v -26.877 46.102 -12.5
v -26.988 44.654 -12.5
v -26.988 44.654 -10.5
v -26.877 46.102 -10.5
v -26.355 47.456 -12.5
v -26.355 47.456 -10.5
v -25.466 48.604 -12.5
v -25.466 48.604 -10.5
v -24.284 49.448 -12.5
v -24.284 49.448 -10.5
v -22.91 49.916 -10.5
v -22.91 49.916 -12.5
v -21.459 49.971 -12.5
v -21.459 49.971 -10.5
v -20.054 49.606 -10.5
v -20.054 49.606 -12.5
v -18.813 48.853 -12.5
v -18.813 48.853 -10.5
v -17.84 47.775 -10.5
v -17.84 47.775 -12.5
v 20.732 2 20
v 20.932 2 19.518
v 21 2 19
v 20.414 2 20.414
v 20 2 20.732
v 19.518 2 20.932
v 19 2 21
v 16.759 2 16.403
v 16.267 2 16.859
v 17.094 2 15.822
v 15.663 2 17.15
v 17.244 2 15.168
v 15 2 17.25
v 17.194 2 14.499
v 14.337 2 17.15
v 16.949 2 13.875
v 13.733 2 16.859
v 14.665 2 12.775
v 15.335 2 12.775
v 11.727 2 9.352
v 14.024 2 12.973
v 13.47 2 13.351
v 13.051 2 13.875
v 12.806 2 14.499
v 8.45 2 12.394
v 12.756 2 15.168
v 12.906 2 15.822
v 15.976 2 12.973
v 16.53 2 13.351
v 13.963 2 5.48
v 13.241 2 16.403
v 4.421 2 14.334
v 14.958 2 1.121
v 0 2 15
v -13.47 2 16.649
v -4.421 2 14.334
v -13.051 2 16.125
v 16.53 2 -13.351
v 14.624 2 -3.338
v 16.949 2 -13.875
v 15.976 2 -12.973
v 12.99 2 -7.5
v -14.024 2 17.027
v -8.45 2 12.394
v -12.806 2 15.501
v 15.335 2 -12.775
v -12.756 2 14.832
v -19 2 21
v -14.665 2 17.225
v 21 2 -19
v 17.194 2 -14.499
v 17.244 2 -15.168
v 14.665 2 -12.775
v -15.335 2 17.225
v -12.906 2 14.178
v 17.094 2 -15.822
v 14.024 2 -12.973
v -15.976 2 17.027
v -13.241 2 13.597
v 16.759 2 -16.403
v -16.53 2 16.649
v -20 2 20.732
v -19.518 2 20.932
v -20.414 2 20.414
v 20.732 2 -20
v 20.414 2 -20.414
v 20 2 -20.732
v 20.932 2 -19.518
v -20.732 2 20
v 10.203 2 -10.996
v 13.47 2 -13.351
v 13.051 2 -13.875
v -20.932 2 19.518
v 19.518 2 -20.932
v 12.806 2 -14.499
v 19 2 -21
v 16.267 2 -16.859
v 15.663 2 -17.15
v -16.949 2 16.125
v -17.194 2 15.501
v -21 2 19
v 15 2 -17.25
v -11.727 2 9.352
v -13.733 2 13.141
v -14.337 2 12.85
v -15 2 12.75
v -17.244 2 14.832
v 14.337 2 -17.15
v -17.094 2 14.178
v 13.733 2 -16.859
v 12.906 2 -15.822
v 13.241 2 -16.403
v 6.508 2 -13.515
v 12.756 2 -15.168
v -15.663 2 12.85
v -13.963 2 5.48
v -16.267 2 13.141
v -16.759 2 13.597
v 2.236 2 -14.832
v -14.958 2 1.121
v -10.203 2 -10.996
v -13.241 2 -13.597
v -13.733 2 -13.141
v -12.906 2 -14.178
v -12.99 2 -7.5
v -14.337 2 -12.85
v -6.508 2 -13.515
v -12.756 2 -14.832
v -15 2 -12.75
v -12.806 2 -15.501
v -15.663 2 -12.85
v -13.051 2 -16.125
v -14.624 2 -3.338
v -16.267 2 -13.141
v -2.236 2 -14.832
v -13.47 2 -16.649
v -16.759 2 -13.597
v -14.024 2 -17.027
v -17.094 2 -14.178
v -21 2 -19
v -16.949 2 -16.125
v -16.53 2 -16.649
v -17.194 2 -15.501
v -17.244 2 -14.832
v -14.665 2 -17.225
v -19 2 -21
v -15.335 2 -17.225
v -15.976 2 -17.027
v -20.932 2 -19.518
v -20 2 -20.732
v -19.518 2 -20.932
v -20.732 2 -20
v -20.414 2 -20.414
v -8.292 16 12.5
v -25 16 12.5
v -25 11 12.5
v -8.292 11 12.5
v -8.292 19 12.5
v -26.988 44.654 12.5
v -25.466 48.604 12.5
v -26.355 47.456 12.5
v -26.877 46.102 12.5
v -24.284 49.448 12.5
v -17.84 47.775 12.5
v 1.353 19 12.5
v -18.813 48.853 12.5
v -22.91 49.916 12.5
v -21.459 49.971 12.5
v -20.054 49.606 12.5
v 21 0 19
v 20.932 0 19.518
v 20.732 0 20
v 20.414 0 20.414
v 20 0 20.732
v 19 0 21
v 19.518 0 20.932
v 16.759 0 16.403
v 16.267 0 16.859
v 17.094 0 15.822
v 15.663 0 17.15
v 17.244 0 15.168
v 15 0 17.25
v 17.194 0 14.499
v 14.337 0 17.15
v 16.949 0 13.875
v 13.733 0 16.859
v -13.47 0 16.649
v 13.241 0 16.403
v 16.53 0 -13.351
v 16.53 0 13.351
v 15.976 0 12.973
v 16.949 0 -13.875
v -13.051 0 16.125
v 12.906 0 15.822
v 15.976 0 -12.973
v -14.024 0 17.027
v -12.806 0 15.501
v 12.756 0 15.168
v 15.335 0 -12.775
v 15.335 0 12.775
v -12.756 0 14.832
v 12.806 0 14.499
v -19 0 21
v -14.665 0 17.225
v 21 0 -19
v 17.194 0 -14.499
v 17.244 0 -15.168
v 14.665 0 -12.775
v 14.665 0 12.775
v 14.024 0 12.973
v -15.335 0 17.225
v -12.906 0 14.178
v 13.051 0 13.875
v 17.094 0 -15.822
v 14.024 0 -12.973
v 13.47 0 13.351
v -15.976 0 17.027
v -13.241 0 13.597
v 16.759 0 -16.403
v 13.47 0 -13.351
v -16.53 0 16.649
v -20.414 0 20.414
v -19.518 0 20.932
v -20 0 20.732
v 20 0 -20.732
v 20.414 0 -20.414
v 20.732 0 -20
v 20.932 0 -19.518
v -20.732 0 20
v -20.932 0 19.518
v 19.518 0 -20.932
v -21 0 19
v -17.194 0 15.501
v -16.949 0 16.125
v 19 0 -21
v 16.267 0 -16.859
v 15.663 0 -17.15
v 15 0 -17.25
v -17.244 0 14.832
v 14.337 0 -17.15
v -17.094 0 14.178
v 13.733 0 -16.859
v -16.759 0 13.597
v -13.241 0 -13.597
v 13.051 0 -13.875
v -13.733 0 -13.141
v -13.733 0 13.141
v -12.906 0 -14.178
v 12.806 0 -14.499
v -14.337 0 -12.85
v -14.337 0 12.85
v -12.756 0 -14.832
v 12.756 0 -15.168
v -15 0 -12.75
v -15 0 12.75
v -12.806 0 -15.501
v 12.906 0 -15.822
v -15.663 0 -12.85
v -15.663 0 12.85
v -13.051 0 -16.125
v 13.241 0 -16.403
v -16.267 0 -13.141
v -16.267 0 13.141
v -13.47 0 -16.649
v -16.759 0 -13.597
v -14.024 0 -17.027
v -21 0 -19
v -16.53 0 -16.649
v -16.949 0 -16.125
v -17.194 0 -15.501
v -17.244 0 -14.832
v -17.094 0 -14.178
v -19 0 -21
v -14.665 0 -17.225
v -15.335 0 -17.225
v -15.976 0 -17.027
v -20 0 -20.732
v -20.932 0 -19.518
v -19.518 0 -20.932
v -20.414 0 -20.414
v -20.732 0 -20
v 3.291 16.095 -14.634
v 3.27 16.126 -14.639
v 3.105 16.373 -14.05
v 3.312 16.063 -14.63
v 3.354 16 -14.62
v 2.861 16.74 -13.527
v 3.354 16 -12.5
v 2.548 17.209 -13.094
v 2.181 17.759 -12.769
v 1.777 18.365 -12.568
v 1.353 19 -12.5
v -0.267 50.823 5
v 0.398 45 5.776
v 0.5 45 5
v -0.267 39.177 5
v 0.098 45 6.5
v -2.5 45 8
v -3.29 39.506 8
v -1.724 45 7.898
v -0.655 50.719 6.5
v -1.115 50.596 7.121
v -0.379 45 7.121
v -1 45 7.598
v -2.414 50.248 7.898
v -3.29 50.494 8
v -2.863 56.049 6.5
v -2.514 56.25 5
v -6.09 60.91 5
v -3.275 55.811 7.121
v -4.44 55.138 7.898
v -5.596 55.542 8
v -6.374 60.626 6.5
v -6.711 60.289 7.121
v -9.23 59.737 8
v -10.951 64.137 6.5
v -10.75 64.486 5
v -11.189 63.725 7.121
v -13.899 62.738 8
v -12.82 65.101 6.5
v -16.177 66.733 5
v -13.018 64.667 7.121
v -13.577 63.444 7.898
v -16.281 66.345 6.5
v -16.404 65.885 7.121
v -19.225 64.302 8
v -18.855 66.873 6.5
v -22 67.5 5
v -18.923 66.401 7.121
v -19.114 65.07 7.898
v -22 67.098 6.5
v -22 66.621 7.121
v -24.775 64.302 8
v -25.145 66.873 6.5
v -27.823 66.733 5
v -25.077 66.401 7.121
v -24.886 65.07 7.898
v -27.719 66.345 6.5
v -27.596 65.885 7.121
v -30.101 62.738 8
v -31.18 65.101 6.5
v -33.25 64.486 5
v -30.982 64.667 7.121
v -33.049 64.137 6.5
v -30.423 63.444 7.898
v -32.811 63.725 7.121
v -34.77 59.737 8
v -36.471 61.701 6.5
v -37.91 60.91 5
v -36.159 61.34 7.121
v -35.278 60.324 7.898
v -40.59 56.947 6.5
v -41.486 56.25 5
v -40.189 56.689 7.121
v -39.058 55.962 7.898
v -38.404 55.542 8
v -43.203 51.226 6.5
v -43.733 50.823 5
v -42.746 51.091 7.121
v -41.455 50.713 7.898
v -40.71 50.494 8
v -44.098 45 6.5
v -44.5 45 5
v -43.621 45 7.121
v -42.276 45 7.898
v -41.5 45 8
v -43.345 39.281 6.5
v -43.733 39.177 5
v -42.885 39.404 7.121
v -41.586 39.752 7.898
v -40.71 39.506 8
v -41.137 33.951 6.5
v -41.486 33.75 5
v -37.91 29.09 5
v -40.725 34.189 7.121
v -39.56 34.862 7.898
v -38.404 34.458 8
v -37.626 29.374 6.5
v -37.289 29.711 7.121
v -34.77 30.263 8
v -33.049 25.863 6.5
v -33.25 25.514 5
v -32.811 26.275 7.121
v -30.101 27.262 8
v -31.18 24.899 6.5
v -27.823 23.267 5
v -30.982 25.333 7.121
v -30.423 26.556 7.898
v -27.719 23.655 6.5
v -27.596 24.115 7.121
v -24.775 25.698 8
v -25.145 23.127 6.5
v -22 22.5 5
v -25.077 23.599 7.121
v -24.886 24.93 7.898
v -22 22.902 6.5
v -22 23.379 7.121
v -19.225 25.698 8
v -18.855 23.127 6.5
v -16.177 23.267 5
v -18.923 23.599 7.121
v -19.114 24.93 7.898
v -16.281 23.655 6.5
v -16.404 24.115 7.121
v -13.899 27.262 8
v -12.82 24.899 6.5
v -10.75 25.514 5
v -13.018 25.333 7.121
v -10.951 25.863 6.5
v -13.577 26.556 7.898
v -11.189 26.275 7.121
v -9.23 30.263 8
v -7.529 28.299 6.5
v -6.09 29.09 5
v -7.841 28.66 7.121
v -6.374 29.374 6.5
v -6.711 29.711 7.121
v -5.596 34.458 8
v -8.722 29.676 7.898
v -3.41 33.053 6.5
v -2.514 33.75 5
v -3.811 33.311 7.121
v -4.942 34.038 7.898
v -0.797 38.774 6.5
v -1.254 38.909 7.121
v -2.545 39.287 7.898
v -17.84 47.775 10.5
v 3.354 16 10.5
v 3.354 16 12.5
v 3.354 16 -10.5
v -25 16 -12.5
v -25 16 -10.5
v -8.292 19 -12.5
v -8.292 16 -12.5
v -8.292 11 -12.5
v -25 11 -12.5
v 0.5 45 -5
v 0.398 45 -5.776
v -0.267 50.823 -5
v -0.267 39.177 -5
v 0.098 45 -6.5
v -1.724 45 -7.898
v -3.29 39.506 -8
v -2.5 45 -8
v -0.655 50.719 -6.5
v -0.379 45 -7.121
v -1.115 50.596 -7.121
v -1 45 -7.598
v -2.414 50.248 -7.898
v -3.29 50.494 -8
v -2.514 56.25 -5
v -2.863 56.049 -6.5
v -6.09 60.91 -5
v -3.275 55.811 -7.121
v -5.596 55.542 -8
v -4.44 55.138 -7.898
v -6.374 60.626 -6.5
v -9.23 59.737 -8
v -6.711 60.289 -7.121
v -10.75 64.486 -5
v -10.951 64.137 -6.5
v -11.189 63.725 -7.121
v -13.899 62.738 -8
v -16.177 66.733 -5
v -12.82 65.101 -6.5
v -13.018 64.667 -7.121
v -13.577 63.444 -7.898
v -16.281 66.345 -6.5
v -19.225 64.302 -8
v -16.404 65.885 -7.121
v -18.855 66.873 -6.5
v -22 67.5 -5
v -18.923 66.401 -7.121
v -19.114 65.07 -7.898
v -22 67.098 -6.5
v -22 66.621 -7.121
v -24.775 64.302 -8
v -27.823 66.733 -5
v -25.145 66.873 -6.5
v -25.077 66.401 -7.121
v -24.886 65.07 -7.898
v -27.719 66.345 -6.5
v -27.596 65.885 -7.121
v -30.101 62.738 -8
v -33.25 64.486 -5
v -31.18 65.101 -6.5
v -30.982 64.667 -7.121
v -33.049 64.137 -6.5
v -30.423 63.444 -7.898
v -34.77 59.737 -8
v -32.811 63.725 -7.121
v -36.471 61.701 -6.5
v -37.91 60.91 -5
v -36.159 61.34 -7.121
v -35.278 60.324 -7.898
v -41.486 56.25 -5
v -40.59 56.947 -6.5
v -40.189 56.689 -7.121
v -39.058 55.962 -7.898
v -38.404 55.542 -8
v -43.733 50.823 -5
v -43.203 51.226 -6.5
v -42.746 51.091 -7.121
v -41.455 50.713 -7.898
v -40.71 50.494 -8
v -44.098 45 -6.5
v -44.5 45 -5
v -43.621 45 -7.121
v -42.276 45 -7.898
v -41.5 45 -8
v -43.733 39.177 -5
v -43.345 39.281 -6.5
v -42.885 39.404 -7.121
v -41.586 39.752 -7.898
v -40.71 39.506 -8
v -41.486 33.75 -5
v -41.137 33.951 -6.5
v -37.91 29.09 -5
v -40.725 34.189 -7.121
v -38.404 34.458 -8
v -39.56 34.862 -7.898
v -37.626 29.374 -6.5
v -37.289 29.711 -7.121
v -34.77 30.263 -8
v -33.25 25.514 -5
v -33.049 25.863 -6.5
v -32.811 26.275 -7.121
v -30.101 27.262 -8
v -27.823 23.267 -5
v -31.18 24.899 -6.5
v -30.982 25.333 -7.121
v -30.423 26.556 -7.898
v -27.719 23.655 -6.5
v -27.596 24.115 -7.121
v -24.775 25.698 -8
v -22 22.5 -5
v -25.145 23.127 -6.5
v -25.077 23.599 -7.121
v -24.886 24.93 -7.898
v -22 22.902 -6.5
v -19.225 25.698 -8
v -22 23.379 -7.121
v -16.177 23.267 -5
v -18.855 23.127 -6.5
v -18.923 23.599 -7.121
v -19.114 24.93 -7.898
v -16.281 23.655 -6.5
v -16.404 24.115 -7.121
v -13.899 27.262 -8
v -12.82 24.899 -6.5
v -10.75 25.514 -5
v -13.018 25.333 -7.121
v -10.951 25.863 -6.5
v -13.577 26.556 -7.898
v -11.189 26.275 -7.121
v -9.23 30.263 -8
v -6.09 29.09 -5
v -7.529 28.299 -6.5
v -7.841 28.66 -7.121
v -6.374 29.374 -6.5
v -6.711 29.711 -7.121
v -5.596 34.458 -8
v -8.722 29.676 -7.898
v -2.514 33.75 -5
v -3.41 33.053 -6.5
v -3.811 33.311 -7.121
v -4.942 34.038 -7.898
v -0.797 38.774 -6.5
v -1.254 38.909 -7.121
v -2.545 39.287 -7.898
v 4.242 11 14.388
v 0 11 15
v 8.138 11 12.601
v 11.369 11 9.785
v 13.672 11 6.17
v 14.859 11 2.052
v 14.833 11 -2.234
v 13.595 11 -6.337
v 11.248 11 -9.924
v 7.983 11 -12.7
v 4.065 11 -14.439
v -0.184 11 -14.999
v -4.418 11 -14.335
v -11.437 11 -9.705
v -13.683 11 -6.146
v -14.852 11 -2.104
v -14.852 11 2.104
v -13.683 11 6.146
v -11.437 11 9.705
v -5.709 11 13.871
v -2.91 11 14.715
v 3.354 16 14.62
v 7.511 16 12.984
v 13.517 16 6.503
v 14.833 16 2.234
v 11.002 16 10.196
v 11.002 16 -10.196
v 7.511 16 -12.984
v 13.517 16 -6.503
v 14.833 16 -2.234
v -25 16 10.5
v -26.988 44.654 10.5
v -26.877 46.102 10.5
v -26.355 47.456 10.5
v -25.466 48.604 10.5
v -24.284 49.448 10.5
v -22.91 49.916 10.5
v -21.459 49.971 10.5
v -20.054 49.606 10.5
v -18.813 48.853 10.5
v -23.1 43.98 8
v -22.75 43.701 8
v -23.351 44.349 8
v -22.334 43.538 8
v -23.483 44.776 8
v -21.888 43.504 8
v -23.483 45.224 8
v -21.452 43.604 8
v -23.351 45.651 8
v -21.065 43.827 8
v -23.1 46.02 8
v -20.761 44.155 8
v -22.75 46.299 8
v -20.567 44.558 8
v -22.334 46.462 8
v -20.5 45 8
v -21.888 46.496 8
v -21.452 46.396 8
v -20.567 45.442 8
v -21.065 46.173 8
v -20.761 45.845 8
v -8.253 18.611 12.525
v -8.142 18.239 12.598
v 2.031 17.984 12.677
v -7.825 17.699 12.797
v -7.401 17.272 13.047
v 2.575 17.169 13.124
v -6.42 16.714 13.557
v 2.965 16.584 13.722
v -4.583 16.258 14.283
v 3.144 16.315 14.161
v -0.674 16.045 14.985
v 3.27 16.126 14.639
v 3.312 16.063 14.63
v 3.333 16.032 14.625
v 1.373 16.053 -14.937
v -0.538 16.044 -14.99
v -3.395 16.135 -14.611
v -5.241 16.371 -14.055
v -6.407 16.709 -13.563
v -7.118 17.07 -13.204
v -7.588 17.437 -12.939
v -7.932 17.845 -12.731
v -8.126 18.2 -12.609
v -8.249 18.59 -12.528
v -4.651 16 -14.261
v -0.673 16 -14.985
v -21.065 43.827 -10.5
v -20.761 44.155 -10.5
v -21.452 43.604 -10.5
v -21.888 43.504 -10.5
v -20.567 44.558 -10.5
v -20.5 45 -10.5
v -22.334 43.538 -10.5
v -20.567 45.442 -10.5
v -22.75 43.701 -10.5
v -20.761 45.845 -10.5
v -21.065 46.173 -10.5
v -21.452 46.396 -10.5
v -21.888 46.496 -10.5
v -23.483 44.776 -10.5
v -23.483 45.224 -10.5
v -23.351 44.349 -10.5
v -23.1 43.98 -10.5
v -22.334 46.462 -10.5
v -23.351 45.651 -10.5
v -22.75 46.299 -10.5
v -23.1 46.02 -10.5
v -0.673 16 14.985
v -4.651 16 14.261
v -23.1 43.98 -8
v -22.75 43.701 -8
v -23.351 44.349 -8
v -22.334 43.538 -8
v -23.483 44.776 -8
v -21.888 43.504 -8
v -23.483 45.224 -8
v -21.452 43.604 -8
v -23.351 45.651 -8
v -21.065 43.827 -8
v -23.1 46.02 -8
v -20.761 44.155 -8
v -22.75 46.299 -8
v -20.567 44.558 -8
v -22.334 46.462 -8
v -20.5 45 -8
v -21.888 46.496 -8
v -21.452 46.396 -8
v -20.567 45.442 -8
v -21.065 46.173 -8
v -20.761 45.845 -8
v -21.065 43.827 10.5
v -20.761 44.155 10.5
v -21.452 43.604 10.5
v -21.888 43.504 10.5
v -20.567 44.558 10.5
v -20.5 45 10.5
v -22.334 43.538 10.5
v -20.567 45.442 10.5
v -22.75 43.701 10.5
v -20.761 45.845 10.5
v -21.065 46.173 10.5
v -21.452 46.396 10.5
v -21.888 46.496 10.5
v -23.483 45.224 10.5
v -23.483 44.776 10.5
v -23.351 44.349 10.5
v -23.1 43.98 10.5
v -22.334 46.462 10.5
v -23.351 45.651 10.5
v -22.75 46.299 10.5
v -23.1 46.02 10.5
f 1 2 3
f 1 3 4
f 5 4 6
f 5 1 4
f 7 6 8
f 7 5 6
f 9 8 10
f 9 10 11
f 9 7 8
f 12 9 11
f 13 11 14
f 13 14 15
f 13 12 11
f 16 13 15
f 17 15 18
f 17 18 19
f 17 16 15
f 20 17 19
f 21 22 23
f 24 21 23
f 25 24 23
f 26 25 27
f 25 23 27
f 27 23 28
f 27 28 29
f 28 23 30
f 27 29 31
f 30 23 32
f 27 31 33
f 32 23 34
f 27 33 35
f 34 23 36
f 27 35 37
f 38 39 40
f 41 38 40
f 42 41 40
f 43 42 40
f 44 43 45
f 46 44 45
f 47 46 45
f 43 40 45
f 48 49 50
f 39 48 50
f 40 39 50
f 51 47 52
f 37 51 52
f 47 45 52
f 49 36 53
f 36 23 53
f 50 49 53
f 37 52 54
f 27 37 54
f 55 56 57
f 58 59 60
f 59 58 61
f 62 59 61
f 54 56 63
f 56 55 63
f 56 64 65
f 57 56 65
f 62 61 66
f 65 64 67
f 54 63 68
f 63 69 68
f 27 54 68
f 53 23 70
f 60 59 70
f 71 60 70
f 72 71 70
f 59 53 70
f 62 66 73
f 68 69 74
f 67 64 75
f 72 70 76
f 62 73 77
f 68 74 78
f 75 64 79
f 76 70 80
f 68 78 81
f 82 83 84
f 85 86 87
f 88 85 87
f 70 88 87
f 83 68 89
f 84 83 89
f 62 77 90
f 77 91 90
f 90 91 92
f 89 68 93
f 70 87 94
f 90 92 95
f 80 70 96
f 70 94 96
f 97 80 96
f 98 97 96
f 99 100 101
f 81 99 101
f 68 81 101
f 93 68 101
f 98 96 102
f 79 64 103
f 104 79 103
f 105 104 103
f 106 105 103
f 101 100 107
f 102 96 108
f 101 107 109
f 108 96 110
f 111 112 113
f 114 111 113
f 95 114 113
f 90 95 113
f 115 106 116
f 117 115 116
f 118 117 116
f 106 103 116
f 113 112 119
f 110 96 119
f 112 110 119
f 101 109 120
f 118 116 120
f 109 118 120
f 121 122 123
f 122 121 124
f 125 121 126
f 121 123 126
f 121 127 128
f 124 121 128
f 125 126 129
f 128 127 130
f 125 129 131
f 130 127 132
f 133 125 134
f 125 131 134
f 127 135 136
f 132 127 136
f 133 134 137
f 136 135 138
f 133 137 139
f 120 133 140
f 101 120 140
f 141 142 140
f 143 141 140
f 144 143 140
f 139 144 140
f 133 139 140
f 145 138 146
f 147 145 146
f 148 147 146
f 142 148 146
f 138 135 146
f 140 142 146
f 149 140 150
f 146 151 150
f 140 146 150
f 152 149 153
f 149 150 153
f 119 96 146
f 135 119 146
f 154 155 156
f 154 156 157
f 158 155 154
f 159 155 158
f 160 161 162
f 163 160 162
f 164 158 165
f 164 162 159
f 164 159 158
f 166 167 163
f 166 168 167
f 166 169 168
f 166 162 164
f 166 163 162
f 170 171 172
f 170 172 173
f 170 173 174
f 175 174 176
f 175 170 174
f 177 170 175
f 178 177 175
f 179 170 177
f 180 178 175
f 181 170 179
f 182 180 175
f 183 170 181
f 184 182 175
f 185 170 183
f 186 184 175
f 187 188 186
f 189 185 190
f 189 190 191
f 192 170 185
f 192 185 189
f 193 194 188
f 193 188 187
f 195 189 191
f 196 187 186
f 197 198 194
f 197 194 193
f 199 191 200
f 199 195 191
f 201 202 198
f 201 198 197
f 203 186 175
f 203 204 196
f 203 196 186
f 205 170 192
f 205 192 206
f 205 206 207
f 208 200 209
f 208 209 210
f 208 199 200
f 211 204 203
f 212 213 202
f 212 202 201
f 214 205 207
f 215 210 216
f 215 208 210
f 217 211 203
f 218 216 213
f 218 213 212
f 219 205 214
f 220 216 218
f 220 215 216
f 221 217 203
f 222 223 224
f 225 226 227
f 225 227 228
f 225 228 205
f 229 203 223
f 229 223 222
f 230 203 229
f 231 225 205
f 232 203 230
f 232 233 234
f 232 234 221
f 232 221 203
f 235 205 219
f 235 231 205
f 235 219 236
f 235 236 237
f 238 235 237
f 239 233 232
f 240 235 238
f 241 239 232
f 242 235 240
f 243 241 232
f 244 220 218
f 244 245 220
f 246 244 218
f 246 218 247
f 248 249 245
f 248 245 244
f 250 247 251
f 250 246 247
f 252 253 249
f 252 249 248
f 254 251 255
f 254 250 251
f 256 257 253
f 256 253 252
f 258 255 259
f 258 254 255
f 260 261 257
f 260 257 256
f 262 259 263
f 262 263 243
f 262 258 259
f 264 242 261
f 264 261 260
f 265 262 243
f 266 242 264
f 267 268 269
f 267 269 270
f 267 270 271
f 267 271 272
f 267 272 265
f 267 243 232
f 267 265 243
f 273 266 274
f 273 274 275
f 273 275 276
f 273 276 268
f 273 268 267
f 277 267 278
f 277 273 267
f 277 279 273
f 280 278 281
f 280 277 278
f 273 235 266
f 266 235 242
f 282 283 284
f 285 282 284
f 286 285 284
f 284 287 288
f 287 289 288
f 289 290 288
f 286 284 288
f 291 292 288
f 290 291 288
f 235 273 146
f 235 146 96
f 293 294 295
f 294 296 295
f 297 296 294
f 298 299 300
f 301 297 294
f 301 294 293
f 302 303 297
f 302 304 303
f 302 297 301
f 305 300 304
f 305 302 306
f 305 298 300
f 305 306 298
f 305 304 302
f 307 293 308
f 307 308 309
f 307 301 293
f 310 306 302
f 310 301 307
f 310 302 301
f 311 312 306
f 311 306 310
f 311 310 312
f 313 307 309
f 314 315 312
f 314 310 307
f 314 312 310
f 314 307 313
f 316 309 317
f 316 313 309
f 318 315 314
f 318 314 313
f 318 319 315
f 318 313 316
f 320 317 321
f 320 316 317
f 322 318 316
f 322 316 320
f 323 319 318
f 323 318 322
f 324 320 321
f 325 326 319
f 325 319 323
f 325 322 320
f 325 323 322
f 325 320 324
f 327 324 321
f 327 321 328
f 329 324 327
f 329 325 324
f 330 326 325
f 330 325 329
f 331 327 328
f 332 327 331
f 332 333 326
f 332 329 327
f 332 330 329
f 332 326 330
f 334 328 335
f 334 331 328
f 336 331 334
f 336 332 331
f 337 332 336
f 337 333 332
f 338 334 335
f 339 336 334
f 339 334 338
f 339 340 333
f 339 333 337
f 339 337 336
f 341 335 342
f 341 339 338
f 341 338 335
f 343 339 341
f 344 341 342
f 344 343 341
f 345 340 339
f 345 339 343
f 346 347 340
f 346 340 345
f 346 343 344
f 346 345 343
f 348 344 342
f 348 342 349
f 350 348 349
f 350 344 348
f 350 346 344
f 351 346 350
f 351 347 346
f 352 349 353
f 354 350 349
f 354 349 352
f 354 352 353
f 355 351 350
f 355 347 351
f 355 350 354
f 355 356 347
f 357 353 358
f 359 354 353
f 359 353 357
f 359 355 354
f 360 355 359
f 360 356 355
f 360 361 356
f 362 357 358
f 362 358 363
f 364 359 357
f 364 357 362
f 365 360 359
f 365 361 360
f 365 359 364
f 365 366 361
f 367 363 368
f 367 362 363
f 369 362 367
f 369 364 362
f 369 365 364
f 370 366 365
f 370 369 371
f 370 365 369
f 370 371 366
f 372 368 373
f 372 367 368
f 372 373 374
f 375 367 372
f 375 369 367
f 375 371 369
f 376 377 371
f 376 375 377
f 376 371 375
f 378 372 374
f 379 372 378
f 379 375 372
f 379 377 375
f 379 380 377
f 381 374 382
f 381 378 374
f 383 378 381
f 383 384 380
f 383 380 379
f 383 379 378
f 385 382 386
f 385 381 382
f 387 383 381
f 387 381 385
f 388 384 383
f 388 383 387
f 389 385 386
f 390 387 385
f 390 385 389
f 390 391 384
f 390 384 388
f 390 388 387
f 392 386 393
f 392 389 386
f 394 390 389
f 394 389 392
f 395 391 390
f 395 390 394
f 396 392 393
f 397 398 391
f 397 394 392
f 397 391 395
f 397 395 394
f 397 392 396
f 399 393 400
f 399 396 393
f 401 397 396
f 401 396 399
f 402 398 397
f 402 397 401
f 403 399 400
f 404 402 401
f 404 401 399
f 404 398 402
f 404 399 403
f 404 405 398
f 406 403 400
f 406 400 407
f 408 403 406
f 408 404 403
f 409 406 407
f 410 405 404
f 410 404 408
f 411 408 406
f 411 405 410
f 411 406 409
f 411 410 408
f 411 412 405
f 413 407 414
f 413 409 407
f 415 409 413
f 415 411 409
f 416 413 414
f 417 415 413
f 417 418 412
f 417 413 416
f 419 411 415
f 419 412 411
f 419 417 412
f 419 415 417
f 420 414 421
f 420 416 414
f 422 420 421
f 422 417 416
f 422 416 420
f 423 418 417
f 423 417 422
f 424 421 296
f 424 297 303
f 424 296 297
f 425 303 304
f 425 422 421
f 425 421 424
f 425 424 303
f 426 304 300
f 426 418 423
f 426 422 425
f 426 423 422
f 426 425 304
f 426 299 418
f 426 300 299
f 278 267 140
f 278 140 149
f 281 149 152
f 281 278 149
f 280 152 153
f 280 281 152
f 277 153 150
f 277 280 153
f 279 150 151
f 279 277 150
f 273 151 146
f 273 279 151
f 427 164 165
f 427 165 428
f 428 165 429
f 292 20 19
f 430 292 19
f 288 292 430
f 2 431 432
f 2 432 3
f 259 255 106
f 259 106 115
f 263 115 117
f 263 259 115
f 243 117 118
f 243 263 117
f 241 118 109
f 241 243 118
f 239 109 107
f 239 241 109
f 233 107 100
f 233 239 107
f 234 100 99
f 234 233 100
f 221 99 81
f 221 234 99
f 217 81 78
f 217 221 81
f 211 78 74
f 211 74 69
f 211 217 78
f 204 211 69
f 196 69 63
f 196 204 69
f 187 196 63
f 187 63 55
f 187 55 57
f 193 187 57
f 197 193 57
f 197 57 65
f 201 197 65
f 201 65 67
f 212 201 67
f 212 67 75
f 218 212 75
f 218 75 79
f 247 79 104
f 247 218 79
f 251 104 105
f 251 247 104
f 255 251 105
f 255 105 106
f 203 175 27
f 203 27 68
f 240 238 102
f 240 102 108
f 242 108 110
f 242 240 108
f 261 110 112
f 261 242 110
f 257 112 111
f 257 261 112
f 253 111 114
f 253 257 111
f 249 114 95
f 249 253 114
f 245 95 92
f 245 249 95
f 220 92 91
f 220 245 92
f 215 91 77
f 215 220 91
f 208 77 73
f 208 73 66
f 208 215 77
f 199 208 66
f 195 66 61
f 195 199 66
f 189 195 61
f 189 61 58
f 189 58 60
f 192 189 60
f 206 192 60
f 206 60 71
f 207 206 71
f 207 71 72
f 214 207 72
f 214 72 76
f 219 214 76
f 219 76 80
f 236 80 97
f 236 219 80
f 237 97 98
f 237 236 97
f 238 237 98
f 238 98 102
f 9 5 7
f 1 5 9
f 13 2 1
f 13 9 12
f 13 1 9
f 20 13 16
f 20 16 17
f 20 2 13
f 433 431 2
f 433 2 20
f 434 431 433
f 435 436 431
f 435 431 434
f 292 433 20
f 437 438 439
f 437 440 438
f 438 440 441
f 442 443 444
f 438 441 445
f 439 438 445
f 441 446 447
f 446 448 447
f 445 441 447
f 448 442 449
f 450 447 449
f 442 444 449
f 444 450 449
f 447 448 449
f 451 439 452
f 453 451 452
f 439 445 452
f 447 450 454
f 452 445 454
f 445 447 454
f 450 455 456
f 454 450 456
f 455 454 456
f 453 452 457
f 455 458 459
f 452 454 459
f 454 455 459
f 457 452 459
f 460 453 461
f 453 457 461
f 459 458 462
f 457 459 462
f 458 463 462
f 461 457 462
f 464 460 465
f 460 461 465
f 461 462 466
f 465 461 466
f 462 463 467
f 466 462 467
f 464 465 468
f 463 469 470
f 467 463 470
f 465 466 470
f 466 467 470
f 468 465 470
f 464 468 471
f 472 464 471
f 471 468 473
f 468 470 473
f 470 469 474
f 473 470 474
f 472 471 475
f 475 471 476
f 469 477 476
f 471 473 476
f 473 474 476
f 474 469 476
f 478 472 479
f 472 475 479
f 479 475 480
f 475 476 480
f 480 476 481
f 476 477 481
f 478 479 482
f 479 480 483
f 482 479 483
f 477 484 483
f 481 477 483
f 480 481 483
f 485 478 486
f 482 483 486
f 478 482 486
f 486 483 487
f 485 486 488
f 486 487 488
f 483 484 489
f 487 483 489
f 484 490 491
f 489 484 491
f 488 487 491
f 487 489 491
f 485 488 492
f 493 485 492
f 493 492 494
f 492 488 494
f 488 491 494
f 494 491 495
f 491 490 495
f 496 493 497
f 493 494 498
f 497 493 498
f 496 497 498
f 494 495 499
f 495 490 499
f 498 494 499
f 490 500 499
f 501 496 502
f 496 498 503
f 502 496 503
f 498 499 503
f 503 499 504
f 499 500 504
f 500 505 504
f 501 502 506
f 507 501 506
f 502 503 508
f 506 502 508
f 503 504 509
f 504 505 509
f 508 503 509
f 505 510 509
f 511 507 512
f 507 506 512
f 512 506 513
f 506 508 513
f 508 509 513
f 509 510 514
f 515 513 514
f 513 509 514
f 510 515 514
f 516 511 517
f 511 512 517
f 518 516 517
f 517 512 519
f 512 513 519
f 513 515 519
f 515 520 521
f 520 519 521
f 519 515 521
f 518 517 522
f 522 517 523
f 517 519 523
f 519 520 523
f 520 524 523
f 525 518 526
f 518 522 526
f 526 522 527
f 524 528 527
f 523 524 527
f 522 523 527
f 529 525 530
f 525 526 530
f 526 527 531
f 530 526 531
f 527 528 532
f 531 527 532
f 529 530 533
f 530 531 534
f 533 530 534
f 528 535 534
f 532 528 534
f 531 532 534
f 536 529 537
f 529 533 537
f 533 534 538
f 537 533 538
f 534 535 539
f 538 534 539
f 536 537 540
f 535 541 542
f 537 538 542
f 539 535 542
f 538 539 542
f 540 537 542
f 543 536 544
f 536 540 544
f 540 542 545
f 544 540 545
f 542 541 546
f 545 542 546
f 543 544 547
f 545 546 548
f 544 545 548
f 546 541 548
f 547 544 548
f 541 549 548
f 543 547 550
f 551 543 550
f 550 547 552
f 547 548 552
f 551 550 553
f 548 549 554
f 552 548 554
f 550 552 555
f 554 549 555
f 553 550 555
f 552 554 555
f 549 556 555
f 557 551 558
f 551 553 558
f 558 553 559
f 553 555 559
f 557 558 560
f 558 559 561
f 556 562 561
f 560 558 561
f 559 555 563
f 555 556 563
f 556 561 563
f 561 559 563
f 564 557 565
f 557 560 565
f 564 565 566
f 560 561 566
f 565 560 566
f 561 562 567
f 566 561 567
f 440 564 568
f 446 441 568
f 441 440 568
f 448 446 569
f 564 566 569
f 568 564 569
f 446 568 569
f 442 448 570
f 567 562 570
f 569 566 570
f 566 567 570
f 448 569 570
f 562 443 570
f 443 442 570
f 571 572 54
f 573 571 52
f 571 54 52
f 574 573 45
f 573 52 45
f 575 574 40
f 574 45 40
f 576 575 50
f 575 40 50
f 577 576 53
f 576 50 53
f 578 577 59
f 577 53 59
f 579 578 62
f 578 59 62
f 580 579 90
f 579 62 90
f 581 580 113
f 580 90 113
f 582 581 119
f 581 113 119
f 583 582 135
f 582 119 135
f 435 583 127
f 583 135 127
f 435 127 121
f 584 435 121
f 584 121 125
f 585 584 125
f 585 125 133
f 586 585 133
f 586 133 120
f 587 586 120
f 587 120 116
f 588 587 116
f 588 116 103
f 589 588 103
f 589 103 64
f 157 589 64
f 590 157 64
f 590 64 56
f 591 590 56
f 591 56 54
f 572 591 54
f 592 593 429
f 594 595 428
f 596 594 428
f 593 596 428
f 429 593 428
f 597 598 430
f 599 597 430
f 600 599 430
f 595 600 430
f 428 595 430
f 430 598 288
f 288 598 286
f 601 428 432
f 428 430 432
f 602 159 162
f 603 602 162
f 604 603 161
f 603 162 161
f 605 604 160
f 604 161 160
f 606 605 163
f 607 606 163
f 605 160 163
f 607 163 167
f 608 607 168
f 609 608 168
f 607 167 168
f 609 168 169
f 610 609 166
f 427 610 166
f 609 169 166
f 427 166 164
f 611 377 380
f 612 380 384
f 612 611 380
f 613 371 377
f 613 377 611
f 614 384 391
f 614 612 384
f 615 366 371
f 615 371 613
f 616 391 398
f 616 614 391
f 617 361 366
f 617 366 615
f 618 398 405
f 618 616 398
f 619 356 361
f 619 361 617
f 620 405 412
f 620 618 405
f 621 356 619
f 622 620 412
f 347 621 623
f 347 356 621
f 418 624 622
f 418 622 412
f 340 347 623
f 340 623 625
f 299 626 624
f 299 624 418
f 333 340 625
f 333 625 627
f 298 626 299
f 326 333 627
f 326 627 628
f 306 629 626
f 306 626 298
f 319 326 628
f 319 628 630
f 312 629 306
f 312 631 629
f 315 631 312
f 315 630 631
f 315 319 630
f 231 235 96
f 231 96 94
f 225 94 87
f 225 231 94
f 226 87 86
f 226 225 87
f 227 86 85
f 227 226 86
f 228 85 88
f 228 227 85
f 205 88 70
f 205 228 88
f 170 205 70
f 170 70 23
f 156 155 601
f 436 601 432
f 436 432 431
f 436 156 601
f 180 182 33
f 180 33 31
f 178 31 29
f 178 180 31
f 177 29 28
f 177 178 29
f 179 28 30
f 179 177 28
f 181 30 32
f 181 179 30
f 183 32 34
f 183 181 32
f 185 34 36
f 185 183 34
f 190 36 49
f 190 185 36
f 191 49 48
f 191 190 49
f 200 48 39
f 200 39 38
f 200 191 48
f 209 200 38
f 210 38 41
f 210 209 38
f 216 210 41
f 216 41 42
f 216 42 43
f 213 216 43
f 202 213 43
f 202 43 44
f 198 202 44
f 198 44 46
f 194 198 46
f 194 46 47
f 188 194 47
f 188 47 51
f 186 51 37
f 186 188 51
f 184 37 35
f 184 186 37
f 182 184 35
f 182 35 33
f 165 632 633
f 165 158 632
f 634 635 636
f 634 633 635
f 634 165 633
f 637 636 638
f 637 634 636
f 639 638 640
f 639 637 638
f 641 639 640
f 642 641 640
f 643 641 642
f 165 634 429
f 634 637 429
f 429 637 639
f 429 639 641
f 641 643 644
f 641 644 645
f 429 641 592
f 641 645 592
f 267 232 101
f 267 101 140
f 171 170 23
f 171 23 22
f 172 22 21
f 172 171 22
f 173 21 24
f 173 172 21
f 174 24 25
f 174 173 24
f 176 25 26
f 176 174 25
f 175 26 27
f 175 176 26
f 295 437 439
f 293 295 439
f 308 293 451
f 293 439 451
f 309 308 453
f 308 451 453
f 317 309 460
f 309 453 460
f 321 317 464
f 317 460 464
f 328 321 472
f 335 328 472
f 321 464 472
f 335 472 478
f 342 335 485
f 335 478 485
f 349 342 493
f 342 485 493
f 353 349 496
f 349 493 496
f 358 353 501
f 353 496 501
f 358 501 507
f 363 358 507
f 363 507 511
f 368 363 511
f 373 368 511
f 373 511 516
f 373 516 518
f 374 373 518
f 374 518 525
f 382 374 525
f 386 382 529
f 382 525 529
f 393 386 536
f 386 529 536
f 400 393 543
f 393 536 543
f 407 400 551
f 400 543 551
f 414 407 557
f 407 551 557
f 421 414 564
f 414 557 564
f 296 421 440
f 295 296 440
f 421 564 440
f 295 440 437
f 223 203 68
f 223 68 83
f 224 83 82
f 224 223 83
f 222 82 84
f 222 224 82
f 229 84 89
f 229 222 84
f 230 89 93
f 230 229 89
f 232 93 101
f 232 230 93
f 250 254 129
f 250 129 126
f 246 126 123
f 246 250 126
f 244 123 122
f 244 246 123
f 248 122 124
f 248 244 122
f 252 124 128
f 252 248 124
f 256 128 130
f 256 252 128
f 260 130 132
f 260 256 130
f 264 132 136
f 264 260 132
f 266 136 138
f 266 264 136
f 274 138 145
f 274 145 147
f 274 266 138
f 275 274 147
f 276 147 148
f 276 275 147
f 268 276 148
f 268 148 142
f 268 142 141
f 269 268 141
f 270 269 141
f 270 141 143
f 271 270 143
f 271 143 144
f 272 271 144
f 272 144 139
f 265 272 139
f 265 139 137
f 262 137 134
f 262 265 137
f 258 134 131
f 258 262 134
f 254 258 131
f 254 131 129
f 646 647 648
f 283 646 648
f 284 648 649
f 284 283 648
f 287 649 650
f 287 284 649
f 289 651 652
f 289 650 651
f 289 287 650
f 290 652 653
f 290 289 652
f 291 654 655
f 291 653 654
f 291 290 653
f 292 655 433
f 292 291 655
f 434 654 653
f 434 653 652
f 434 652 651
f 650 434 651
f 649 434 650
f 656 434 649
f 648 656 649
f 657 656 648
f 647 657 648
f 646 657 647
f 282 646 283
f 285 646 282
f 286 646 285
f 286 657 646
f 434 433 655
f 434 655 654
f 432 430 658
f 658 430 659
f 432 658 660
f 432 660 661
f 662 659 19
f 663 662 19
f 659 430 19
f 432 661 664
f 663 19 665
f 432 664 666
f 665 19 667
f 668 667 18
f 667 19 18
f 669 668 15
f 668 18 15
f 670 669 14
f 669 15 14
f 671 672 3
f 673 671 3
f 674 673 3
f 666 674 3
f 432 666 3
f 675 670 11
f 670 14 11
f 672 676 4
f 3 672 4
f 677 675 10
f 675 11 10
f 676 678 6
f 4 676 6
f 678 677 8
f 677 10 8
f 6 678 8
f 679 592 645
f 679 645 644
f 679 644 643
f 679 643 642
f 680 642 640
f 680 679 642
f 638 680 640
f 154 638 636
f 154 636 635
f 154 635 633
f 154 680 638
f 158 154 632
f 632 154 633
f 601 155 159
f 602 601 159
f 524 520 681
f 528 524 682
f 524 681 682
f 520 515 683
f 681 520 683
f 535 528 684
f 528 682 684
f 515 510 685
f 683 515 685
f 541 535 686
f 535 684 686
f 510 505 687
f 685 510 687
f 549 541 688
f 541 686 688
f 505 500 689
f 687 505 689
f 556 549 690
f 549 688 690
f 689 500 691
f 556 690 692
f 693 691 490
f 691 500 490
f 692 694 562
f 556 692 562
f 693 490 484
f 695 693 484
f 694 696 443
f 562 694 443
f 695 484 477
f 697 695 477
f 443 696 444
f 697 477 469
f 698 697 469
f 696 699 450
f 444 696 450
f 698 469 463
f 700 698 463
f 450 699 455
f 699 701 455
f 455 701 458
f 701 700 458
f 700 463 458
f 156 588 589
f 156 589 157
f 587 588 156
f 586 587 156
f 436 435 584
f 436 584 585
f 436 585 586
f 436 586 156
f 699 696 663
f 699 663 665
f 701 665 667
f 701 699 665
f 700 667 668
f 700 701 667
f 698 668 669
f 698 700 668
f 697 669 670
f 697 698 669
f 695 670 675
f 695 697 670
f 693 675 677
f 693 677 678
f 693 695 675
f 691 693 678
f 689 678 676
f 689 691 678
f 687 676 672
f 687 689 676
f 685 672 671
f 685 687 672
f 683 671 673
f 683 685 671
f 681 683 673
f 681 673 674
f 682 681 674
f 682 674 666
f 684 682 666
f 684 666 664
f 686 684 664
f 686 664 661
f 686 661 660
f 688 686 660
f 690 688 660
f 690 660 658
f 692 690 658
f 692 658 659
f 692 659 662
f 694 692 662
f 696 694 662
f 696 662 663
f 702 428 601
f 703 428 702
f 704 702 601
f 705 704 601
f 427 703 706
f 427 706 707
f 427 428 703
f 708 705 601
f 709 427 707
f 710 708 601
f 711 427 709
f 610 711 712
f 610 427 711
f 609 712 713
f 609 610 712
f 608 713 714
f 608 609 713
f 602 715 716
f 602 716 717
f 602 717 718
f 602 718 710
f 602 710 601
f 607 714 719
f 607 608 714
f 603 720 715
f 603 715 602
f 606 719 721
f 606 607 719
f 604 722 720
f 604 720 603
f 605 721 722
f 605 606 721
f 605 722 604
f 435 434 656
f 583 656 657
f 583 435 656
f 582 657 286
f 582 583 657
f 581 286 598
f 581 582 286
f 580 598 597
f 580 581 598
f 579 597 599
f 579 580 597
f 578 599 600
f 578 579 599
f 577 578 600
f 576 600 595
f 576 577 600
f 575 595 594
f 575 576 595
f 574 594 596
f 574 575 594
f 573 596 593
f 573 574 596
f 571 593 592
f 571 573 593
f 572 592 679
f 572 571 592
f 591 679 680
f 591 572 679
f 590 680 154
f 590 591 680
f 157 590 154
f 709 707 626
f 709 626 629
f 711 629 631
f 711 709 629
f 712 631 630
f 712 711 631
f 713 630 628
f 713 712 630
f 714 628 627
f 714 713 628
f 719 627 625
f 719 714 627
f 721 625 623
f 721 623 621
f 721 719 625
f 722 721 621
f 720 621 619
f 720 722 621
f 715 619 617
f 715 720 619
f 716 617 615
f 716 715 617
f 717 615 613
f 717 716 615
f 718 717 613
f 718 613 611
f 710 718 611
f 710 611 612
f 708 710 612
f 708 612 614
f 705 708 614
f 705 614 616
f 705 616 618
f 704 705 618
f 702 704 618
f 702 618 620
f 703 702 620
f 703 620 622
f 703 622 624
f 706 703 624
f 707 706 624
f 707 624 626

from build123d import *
from build123d.topology import SkipClean

# Parameters (mm, degrees)
SKETCH1_R                = 2.25
BOSS_EXTRUDE1_DEPTH      = 2
SKETCH2_R                = 15
BOSS_EXTRUDE2_DEPTH      = 9
BOSS_EXTRUDE3_DEPTH      = 5
SKETCH4_R                = 1.5
BOSS_EXTRUDE4_DEPTH      = 2
FILLET1_R                = 3
BOSS_EXTRUDE5_DEPTH      = 8
BOSS_EXTRUDE5_DEPTH_BACK = 8
SKETCH5_R                = 22.5
FILLET2_R                = 3
SKETCH6_R                = 1.5
BOSS_EXTRUDE6_DEPTH      = 25


with BuildPart() as part:
    # Sketch1 → Boss-Extrude1 (new body)
    with BuildSketch(Plane(origin=(0, 0, 0), x_dir=(1, 0, 0), z_dir=(0, 1, 0))):
        with BuildLine():
            Line((-19, 21), (19, 21))
            ThreePointArc((19, 21), (20.414213562, 20.414213562), (21, 19))
            Line((21, 19), (21, -19))
            ThreePointArc((21, -19), (20.414213562, -20.414213562), (19, -21))
            Line((19, -21), (-19, -21))
            ThreePointArc((-19, -21), (-20.414213562, -20.414213562), (-21, -19))
            Line((-21, -19), (-21, 19))
            ThreePointArc((-21, 19), (-20.414213562, 20.414213562), (-19, 21))
        make_face()
        with Locations(Location((-15, 15, 0), (0, 0, 270))):
            Circle(SKETCH1_R, mode=Mode.SUBTRACT)
        with Locations(Location((15, 15, 0), (0, 0, 90))):
            Circle(SKETCH1_R, mode=Mode.SUBTRACT)
        with Locations(Location((15, -15, 0), (0, 0, 270))):
            Circle(SKETCH1_R, mode=Mode.SUBTRACT)
        with Locations(Location((-15, -15, 0), (0, 0, 90))):
            Circle(SKETCH1_R, mode=Mode.SUBTRACT)
    extrude(amount=BOSS_EXTRUDE1_DEPTH)

    # Sketch2 → Boss-Extrude2 (add)
    with BuildSketch(Plane(origin=(0, 2, 0), x_dir=(1, 0, 0), z_dir=(0, 1, 0))):
        with Locations(Location((0, 0, 0), (0, 0, 270))):
            Circle(SKETCH2_R)
    extrude(amount=BOSS_EXTRUDE2_DEPTH)

    # Sketch3 → Boss-Extrude3 (add)
    with SkipClean():  # the faces are left unmerged after this step: merging them gives an invalid solid
        with BuildSketch(Plane(origin=(0, 11, 0), x_dir=(1, 0, 0), z_dir=(0, 1, 0))):
            with BuildLine():
                Line((-25, 12.5), (-8.291561976, 12.5))
                ThreePointArc((-8.291561976, 12.5), (15, 0), (-8.291561976, -12.5))
                Line((-8.291561976, -12.5), (-25, -12.5))
                Line((-25, -12.5), (-25, 12.5))
            make_face()
        extrude(amount=BOSS_EXTRUDE3_DEPTH)

    # Sketch4 → Boss-Extrude4 (add)
    with SkipClean():  # the faces are left unmerged after this step: merging them gives an invalid solid
        with BuildSketch(Plane.XY.offset(12.5)):
            with BuildLine():
                Line((-25, 16), (-26.988009316, 44.653931998))
                ThreePointArc((-26.988009316, 44.653931998), (-23.614360312, 49.732213096), (-17.840451563, 47.774555244))
                Line((-17.840451563, 47.774555244), (3.354219012, 16))
                Line((3.354219012, 16), (-25, 16))
            make_face()
            with Locations((-22, 45)):
                Circle(SKETCH4_R, mode=Mode.SUBTRACT)
        boss_extrude4 = extrude(amount=-BOSS_EXTRUDE4_DEPTH)

    # Mirror1: Boss-Extrude4 across plane
    with SkipClean():  # the faces are left unmerged after this step: merging them gives an invalid solid
        add(boss_extrude4.mirror(Plane.XY))

    # Fillet1
    # the kernel refuses this fillet: 3 mm, written as the material it adds along each edge
    with BuildSketch(Plane(origin=(10.854219012, 16, 12.5), x_dir=(0, 0, 1), z_dir=(-1, 0, 0))) as fillet1_piece_1_section:
        with BuildLine():
            CenterArc((FILLET1_R, FILLET1_R), FILLET1_R, 180, 90)
            Line((0, FILLET1_R), (0, 0))
            Line((0, 0), (FILLET1_R, 0))
        make_face()
    fillet1_piece_1 = extrude(amount=26.645780988, mode=Mode.PRIVATE)
    fillet1_piece_1 = fillet1_piece_1 & Plane(origin=(0, 16.711249506, 0), x_dir=(-0.5527707983925666, 0, -0.8333333333333335), z_dir=(0, -1, 0)) * Cylinder(15, 66, mode=Mode.PRIVATE)
    fillet1_piece_1 = split(fillet1_piece_1, bisect_by=Plane(origin=(1.321328689, 19.047661706, 13.078964715), z_dir=(-0.8319096874112317, -0.5549110487198348, 0)), keep=Keep.TOP, mode=Mode.PRIVATE)
    add(fillet1_piece_1)
    with BuildSketch(Plane(origin=(10.854219012, 16, -12.5), x_dir=(0, 0, -1), z_dir=(-1, 0, 0))) as fillet1_piece_2_section:
        with BuildLine():
            CenterArc((FILLET1_R, -FILLET1_R), FILLET1_R, 90, 90)
            Line((0, -FILLET1_R), (0, 0))
            Line((0, 0), (FILLET1_R, 0))
        make_face()
    fillet1_piece_2 = extrude(amount=26.645780988, mode=Mode.PRIVATE)
    fillet1_piece_2 = fillet1_piece_2 & Plane(origin=(0, 16.711251501, 0), x_dir=(-0.5527707983925666, 0, -0.8333333333333335), z_dir=(0, -1, 0)) * Cylinder(15, 66, mode=Mode.PRIVATE)
    fillet1_piece_2 = split(fillet1_piece_2, bisect_by=Plane(origin=(1.321327042, 19.047664174, -13.078969709), z_dir=(-0.8319096874112317, -0.5549110487198348, 0)), keep=Keep.TOP, mode=Mode.PRIVATE)
    add(fillet1_piece_2)



with BuildPart() as body_2:
    # Sketch5 → Boss-Extrude5 (new, two sides: drawn at the far end of the back side and taken through both)
    with BuildSketch(Plane.XY.offset(-BOSS_EXTRUDE5_DEPTH_BACK)):
        with Locations((-22, 45)):
            Circle(SKETCH5_R)
    extrude(amount=BOSS_EXTRUDE5_DEPTH + BOSS_EXTRUDE5_DEPTH_BACK)

    # Fillet2
    fillet2_edges = [body_2.edges().sort_by_distance(p)[0] for p in [
        (-44.5, 45, 8),
        (-44.5, 45, -8),
    ]]
    fillet(fillet2_edges, radius=FILLET2_R)


with BuildPart() as part_1:
    add(part.part)

    add(body_2.part)  # Boss-Extrude6 merges body 2
    # Sketch6 → Boss-Extrude6 (add)
    with BuildSketch(Plane.XY.offset(12.5)):
        with Locations((-22, 45)):
            Circle(SKETCH6_R)
    extrude(amount=-BOSS_EXTRUDE6_DEPTH)


solid = part_1.part
